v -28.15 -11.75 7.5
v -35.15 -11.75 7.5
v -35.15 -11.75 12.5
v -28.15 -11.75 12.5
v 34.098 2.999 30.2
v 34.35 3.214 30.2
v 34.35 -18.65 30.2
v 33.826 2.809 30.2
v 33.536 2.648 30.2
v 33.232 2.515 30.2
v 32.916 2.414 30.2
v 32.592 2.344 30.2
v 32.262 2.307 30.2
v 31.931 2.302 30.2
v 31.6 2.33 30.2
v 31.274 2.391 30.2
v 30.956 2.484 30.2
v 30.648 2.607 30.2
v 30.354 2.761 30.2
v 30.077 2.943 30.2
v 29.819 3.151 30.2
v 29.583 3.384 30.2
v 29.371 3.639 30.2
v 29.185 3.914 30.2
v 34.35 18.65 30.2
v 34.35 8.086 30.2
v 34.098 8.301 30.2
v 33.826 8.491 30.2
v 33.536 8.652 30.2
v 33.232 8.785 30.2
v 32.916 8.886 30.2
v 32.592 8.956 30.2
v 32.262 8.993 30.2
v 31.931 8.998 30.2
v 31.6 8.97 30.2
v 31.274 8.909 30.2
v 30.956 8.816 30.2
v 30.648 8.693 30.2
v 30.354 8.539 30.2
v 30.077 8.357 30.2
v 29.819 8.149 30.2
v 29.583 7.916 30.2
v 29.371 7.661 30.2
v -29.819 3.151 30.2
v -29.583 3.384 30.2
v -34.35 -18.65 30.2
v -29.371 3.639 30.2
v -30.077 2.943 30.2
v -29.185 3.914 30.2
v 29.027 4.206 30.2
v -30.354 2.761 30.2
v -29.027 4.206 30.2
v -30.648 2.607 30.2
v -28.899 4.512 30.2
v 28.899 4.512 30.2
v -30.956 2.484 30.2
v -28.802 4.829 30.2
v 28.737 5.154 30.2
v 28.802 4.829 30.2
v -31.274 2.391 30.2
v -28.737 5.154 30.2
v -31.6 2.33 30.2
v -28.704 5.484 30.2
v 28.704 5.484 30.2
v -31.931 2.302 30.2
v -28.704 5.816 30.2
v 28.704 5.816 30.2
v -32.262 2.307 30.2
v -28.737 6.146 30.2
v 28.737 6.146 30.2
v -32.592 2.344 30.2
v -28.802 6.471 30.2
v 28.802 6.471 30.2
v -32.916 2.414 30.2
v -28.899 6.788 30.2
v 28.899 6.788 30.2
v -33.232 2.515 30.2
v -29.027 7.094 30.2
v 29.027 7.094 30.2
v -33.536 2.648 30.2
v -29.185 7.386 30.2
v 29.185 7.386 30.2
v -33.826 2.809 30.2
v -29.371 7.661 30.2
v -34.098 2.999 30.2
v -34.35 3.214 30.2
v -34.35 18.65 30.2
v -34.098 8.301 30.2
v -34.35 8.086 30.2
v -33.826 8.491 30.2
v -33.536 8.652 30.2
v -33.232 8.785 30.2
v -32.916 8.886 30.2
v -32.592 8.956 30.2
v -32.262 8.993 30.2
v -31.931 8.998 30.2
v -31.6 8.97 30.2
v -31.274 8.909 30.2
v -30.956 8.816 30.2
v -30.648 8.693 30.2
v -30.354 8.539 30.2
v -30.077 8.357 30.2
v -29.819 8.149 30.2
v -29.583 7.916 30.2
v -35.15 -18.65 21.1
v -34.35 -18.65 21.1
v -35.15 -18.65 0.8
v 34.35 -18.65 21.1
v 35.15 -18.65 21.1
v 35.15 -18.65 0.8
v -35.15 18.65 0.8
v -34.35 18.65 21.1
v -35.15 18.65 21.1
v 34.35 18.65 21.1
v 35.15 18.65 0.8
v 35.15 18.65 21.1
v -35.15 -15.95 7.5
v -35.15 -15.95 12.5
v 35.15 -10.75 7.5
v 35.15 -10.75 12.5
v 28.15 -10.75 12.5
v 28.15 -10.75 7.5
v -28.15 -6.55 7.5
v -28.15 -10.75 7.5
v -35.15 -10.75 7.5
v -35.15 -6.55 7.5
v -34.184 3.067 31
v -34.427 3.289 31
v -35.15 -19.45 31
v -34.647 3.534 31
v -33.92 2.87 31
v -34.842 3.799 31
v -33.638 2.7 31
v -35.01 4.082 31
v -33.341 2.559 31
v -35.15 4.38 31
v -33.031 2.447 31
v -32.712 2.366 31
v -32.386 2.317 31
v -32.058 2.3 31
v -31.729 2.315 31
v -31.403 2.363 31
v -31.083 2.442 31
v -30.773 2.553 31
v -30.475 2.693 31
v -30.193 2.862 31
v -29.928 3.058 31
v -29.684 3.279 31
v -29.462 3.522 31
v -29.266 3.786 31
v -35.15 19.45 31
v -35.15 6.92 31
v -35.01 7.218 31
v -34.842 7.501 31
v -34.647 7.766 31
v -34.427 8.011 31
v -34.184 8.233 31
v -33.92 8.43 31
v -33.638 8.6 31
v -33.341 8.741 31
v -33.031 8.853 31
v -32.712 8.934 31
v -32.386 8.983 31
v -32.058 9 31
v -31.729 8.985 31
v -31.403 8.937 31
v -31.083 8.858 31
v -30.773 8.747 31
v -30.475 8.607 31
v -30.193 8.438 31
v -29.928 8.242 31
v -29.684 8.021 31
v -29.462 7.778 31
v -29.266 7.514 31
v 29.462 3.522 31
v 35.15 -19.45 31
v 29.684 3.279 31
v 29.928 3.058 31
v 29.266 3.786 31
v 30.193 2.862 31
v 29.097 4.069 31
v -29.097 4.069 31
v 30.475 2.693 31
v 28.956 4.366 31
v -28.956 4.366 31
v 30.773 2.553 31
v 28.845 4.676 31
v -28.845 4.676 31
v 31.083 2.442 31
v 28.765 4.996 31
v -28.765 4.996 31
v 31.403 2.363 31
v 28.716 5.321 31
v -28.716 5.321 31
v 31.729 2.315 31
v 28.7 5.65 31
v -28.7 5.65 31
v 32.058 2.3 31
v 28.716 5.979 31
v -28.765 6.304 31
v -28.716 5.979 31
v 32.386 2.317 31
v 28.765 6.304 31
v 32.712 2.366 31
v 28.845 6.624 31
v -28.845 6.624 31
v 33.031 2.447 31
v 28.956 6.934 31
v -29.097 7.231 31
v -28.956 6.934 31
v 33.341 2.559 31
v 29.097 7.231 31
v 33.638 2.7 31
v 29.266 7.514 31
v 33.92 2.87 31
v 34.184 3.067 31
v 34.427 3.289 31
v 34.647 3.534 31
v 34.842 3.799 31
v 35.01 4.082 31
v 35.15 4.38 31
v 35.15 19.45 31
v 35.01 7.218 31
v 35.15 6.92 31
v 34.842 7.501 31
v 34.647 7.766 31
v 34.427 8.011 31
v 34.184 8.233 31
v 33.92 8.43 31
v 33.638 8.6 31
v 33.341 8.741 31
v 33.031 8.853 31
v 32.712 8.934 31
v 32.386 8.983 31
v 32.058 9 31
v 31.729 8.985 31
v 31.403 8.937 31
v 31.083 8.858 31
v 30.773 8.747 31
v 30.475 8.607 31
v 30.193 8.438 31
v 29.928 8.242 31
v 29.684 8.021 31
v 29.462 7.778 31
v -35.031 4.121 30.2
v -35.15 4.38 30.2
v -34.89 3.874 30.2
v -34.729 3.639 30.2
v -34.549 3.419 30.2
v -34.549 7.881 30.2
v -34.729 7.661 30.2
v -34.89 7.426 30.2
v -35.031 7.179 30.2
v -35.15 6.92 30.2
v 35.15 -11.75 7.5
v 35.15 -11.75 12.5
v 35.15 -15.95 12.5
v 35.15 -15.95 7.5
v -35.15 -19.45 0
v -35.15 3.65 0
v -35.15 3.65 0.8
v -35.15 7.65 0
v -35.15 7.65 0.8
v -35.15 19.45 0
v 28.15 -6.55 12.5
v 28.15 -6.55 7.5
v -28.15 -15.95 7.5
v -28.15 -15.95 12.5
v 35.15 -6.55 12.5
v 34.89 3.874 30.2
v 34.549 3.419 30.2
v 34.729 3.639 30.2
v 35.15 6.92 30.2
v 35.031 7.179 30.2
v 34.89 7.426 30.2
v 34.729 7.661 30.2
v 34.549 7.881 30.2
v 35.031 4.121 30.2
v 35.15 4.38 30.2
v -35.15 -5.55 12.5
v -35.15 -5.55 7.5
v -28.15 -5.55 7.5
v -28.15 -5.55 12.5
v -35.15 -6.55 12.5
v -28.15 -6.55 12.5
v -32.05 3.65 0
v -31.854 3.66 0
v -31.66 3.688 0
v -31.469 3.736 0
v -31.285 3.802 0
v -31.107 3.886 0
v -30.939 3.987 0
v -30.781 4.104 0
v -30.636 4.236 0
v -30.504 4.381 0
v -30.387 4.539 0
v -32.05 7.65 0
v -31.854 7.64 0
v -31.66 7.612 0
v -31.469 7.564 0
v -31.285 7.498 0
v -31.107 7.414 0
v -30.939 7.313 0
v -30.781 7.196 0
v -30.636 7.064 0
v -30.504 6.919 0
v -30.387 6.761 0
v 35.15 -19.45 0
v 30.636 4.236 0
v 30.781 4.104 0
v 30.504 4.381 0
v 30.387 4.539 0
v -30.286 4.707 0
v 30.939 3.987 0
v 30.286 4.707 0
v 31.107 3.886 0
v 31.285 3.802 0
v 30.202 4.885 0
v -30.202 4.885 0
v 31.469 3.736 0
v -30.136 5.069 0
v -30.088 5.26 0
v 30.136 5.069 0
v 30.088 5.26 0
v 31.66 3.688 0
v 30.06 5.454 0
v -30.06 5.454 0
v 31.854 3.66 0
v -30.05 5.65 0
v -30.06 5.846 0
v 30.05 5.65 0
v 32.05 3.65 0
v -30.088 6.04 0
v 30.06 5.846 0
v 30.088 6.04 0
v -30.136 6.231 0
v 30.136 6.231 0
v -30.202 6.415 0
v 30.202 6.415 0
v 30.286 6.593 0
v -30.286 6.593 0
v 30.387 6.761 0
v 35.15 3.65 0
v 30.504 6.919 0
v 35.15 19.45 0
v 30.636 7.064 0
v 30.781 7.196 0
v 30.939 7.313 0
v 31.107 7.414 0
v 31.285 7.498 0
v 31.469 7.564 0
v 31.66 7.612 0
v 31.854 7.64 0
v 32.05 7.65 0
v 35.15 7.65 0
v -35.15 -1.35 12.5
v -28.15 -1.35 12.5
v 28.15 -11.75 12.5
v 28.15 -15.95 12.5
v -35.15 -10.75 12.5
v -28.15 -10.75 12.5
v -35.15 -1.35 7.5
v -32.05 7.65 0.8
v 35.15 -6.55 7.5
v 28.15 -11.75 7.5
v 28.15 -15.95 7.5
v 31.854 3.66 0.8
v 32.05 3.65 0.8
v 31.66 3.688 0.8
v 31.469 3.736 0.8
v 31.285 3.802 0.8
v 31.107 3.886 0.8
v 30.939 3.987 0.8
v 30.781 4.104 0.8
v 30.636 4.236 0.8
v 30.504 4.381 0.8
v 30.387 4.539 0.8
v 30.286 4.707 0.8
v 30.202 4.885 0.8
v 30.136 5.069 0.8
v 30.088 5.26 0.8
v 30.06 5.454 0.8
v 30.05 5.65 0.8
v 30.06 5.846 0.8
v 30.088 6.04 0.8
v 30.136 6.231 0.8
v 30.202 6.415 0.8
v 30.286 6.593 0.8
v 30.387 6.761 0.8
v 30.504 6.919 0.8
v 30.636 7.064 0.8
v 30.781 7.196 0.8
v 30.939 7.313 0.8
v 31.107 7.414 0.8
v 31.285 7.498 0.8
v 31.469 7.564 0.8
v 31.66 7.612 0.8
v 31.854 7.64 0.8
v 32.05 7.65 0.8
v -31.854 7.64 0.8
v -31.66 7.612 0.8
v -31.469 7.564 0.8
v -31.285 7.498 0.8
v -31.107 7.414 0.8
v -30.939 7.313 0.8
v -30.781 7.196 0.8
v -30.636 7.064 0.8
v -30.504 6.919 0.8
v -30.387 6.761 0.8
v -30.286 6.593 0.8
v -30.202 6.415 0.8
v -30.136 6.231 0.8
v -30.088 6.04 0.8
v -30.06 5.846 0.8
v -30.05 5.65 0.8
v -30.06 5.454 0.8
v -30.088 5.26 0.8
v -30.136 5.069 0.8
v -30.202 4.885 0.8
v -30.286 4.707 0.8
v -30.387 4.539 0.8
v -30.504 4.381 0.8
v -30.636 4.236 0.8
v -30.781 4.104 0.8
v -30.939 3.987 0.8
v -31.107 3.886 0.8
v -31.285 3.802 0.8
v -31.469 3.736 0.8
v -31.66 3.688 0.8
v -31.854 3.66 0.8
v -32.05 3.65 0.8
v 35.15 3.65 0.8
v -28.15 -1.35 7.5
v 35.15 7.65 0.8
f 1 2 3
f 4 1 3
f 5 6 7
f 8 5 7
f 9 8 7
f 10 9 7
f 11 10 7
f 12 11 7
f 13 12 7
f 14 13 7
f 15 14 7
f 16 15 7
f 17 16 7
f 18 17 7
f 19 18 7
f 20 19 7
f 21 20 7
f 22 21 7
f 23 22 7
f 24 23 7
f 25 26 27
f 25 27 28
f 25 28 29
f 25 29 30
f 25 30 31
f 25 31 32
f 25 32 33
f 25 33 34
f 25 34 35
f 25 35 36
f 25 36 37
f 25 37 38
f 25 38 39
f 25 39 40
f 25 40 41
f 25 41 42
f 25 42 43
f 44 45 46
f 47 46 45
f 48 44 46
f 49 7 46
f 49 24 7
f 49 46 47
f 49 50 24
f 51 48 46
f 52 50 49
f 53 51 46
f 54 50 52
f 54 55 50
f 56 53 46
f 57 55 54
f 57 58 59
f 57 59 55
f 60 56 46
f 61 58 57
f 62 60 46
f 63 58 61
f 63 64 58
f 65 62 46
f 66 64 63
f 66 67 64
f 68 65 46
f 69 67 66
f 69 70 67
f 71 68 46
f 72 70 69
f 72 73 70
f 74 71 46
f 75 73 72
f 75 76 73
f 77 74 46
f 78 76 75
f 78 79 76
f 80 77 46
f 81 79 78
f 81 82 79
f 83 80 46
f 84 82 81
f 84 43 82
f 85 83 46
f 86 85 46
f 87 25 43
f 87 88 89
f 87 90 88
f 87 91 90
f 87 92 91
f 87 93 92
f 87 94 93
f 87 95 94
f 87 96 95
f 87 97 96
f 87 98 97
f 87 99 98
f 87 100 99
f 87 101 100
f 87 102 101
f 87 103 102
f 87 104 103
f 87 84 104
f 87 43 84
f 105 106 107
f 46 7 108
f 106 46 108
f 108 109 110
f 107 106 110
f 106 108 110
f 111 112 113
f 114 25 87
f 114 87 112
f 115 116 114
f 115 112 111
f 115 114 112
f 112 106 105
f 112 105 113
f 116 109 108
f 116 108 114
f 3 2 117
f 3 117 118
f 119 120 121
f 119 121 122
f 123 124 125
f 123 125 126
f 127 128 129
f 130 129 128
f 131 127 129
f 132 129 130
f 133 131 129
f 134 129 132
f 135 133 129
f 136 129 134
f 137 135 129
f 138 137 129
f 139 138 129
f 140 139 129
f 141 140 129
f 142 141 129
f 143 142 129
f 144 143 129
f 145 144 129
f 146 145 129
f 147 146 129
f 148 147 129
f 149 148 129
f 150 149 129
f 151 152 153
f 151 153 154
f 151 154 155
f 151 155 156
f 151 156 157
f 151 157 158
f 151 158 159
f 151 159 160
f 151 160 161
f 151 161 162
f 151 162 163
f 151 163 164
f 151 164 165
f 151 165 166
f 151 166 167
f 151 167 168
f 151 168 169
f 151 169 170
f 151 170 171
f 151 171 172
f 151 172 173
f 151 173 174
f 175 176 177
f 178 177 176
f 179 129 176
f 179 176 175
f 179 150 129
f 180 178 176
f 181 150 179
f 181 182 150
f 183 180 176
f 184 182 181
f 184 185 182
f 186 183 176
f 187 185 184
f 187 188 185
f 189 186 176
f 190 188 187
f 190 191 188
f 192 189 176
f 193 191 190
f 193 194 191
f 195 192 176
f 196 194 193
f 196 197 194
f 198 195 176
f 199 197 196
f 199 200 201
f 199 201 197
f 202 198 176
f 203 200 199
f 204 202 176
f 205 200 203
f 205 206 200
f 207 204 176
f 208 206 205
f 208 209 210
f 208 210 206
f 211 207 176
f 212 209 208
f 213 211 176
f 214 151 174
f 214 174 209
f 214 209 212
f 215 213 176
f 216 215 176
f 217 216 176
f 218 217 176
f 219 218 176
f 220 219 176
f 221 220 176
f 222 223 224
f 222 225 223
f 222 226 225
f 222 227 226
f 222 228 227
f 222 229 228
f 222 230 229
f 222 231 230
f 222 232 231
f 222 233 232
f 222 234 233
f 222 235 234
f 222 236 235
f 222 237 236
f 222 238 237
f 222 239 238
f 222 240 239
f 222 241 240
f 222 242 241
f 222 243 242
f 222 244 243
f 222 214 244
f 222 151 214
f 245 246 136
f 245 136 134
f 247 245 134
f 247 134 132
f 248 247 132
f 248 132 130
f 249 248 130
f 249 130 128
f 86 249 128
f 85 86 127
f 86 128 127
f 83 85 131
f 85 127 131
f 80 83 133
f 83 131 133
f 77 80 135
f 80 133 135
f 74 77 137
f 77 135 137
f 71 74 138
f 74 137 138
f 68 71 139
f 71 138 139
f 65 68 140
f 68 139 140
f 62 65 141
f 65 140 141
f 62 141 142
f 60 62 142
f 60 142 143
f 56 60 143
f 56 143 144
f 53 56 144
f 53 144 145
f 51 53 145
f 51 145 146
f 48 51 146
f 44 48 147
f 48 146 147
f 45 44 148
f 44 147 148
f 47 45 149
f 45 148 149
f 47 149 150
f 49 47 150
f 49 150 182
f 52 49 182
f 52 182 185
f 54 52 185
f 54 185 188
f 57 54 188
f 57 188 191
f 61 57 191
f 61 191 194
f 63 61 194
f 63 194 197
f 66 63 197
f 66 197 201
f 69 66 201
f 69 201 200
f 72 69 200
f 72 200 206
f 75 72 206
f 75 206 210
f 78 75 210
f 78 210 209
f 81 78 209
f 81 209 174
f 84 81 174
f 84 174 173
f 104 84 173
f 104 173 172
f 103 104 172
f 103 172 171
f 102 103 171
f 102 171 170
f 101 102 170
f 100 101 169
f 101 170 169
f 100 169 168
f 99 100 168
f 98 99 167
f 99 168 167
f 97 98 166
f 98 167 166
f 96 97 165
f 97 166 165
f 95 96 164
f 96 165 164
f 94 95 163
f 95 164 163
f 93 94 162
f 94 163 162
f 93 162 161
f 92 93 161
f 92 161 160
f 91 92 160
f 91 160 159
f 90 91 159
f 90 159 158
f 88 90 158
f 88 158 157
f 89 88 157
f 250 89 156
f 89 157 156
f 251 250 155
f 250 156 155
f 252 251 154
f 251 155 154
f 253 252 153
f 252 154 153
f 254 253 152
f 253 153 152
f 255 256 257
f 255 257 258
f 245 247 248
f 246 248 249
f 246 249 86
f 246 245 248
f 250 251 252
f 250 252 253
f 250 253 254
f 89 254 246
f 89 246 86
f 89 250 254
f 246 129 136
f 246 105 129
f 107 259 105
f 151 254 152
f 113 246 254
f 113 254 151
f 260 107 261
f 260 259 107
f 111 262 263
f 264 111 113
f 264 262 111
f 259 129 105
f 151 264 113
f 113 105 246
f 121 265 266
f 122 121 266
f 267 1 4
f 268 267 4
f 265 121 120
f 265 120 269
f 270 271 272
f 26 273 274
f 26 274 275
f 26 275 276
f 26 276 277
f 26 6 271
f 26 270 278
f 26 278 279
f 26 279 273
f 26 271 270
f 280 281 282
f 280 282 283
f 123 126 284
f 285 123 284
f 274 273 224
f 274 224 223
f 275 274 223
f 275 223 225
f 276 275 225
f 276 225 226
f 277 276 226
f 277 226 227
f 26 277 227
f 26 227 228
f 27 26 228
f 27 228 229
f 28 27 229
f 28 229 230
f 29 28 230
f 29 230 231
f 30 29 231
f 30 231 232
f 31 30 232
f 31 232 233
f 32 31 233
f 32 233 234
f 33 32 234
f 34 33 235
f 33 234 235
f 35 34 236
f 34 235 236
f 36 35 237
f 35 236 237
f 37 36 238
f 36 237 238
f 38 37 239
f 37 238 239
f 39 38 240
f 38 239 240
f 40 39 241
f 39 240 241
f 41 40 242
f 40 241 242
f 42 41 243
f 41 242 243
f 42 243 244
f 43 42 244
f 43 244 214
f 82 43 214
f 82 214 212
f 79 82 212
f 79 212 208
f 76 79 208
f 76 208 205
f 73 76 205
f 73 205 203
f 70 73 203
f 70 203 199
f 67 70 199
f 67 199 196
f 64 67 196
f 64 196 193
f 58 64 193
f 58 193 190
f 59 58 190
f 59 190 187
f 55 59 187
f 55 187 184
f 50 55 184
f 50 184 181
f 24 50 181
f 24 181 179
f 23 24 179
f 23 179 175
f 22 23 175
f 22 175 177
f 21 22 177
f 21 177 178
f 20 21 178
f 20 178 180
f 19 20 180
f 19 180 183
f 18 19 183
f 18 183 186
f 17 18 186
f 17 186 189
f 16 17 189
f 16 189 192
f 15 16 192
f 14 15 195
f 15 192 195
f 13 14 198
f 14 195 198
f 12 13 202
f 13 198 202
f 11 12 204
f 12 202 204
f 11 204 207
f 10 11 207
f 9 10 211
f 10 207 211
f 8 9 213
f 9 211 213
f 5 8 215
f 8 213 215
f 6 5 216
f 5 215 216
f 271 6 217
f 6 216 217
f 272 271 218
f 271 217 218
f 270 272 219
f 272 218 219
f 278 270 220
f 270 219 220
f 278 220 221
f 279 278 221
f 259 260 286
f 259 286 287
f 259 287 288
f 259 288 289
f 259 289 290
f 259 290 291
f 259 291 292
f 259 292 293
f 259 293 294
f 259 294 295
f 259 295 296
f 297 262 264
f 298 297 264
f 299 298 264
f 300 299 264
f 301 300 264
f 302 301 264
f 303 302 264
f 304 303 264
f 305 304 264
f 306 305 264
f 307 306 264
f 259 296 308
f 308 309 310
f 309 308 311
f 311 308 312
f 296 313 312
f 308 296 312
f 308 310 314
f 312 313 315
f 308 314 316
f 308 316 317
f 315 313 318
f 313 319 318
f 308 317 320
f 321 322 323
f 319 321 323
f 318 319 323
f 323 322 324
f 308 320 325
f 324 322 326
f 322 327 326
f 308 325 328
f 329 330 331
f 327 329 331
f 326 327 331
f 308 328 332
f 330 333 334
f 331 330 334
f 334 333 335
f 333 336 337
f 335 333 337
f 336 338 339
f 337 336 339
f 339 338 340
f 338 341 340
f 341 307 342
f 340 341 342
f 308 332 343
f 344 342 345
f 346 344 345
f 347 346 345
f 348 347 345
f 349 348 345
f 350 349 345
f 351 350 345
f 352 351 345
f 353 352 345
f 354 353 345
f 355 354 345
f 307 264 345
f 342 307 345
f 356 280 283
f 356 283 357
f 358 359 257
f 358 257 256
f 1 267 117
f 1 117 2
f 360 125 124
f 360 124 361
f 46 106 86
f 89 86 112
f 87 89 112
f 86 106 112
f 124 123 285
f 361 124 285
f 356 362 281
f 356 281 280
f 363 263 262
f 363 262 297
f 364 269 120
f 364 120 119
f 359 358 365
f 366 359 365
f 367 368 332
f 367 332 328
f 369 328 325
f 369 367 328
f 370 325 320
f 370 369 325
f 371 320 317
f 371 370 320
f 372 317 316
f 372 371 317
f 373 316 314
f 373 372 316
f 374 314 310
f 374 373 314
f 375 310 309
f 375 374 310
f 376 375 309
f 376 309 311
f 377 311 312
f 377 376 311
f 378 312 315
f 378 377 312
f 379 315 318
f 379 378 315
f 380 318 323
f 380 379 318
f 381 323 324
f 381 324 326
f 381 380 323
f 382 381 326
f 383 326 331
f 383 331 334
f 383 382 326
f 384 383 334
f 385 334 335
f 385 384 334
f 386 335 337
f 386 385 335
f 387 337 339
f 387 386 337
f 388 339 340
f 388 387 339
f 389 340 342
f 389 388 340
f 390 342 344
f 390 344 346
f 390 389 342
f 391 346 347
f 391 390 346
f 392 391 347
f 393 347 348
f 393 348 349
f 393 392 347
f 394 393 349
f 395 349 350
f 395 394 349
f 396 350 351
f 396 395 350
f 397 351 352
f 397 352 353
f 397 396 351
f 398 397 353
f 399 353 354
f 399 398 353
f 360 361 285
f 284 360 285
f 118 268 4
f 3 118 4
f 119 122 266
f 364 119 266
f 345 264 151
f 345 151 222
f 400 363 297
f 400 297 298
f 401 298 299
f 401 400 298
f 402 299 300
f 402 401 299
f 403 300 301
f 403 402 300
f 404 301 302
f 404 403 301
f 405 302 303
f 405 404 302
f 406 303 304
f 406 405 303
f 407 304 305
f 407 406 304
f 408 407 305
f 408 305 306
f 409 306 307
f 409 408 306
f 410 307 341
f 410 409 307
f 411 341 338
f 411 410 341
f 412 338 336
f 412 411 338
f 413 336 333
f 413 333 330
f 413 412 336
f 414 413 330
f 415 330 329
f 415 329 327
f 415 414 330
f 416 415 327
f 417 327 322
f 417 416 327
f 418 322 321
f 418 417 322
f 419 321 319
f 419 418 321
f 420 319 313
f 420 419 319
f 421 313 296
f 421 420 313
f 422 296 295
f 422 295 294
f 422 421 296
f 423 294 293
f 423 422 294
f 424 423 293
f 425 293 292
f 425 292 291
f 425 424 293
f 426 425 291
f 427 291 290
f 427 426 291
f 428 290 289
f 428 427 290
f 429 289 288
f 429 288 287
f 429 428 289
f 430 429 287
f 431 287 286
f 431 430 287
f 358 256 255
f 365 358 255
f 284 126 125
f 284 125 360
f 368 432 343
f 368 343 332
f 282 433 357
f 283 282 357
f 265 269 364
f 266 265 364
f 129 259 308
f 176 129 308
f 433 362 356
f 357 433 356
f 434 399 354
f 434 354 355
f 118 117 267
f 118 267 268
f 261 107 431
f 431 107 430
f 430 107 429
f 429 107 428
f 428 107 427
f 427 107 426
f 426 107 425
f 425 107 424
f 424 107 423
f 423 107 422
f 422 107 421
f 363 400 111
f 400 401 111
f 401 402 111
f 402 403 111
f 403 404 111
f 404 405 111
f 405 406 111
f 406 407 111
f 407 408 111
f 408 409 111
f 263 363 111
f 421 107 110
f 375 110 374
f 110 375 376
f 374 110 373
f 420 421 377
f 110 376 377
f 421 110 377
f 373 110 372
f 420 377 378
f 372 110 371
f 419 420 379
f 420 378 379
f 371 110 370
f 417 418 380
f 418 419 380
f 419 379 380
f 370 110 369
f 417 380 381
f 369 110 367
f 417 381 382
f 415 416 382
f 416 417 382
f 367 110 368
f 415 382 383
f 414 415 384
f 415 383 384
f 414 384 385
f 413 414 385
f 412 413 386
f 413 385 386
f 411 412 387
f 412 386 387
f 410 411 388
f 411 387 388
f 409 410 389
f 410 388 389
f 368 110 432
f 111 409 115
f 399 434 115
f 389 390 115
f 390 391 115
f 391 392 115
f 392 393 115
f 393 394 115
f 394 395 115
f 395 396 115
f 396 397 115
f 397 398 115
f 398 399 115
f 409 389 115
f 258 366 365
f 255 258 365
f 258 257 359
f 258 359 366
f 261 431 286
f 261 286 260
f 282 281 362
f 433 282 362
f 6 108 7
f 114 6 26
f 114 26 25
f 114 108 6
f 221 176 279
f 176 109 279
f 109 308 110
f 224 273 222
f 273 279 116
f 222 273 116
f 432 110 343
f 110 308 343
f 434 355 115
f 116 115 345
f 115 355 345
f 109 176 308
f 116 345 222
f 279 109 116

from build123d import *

# Parameters (mm, degrees)
SKETCH1_W        = 70.3
SKETCH1_H        = 38.9
EXTRUDE1_DEPTH   = 31
SKETCH2_W        = 20.3
SKETCH2_H        = 37.3
EXTRUDE2_DEPTH   = 71.3
SKETCH3_W        = 68.7
SKETCH3_H        = 37.3
EXTRUDE3_DEPTH   = 9.1
EXTRUDE4_DEPTH   = 0.8
SKETCH5_R        = 3.35
EXTRUDE5_DEPTH   = 0.8
SKETCH6_W        = 5
SKETCH6_H        = 4.2
EXTRUDE6_DEPTH   = 7
EXTRUDE6_2_DEPTH = 7
EXTRUDE6_3_DEPTH = 7
SKETCH7_W        = 5
SKETCH7_H        = 4.2
EXTRUDE7_DEPTH   = 7
EXTRUDE7_2_DEPTH = 7


with BuildPart() as part:
    # Sketch1 → Extrude1 (new body)
    with BuildSketch(Plane.XY):
        Rectangle(SKETCH1_W, SKETCH1_H)
    extrude(amount=EXTRUDE1_DEPTH)

    # Sketch2 → Extrude2 (cut, through all)
    with BuildSketch(Plane(origin=(35.15, 0, 0), x_dir=(0, 0, -1), z_dir=(1, 0, 0))):
        with Locations((-10.95, 0)):
            Rectangle(SKETCH2_W, SKETCH2_H)
    extrude(amount=-EXTRUDE2_DEPTH, mode=Mode.SUBTRACT)

    # Sketch3 → Extrude3 (cut)
    with BuildSketch(Plane(origin=(0, 0, 21.1), x_dir=(-1, 0, 0), z_dir=(0, 0, -1))):
        Rectangle(SKETCH3_W, SKETCH3_H)
    extrude(amount=-EXTRUDE3_DEPTH, mode=Mode.SUBTRACT)

    # Sketch4 → Extrude4 (cut)
    with BuildSketch(Plane.XY.offset(0.8)):
        with BuildLine():
            Line((32.05, 7.65), (35.15, 7.65))
            Line((35.15, 7.65), (35.15, 3.65))
            Line((35.15, 3.65), (32.05, 3.65))
            ThreePointArc((32.05, 3.65), (30.05, 5.65), (32.05, 7.65))
        make_face()
        with BuildLine():
            Line((-35.15, 7.65), (-32.05, 7.65))
            ThreePointArc((-32.05, 7.65), (-30.05, 5.65), (-32.05, 3.65))
            Line((-32.05, 3.65), (-35.15, 3.65))
            Line((-35.15, 3.65), (-35.15, 7.65))
        make_face()
    extrude(amount=-EXTRUDE4_DEPTH, mode=Mode.SUBTRACT)

    # Sketch5 → Extrude5 (cut)
    with BuildSketch(Plane.XY.offset(31)):
        with Locations((32.05, 5.65)):
            Circle(SKETCH5_R)
        with Locations((-32.05, 5.65)):
            Circle(SKETCH5_R)
    extrude(amount=-EXTRUDE5_DEPTH, mode=Mode.SUBTRACT)


with BuildPart() as body_2:
    # Sketch6 → Extrude6 (new body)
    with BuildSketch(Plane.ZY.offset(35.15)):
        with Locations((10, -3.45)):
            Rectangle(SKETCH6_W, SKETCH6_H)
    extrude(amount=-EXTRUDE6_DEPTH)


with BuildPart() as body_3:
    # Sketch6 → Extrude6 2 (new body)
    with BuildSketch(Plane.ZY.offset(35.15)):
        with Locations((10, -8.65)):
            Rectangle(SKETCH6_W, SKETCH6_H)
    extrude(amount=-EXTRUDE6_2_DEPTH)


with BuildPart() as body_4:
    # Sketch6 → Extrude6 3 (new body)
    with BuildSketch(Plane.ZY.offset(35.15)):
        with Locations((10, -13.85)):
            Rectangle(SKETCH6_W, SKETCH6_H)
    extrude(amount=-EXTRUDE6_3_DEPTH)


with BuildPart() as body_5:
    # Sketch7 → Extrude7 (new body)
    with BuildSketch(Plane(origin=(35.15, 0, 0), x_dir=(0, 0, -1), z_dir=(1, 0, 0))):
        with Locations((-10, -8.65)):
            Rectangle(SKETCH7_W, SKETCH7_H)
    extrude(amount=-EXTRUDE7_DEPTH)


with BuildPart() as body_6:
    # Sketch7 → Extrude7 2 (new body)
    with BuildSketch(Plane(origin=(35.15, 0, 0), x_dir=(0, 0, -1), z_dir=(1, 0, 0))):
        with Locations((-10, -13.85)):
            Rectangle(SKETCH7_W, SKETCH7_H)
    extrude(amount=-EXTRUDE7_2_DEPTH)


solid = Compound([part.part, body_2.part, body_3.part, body_4.part, body_5.part, body_6.part])
